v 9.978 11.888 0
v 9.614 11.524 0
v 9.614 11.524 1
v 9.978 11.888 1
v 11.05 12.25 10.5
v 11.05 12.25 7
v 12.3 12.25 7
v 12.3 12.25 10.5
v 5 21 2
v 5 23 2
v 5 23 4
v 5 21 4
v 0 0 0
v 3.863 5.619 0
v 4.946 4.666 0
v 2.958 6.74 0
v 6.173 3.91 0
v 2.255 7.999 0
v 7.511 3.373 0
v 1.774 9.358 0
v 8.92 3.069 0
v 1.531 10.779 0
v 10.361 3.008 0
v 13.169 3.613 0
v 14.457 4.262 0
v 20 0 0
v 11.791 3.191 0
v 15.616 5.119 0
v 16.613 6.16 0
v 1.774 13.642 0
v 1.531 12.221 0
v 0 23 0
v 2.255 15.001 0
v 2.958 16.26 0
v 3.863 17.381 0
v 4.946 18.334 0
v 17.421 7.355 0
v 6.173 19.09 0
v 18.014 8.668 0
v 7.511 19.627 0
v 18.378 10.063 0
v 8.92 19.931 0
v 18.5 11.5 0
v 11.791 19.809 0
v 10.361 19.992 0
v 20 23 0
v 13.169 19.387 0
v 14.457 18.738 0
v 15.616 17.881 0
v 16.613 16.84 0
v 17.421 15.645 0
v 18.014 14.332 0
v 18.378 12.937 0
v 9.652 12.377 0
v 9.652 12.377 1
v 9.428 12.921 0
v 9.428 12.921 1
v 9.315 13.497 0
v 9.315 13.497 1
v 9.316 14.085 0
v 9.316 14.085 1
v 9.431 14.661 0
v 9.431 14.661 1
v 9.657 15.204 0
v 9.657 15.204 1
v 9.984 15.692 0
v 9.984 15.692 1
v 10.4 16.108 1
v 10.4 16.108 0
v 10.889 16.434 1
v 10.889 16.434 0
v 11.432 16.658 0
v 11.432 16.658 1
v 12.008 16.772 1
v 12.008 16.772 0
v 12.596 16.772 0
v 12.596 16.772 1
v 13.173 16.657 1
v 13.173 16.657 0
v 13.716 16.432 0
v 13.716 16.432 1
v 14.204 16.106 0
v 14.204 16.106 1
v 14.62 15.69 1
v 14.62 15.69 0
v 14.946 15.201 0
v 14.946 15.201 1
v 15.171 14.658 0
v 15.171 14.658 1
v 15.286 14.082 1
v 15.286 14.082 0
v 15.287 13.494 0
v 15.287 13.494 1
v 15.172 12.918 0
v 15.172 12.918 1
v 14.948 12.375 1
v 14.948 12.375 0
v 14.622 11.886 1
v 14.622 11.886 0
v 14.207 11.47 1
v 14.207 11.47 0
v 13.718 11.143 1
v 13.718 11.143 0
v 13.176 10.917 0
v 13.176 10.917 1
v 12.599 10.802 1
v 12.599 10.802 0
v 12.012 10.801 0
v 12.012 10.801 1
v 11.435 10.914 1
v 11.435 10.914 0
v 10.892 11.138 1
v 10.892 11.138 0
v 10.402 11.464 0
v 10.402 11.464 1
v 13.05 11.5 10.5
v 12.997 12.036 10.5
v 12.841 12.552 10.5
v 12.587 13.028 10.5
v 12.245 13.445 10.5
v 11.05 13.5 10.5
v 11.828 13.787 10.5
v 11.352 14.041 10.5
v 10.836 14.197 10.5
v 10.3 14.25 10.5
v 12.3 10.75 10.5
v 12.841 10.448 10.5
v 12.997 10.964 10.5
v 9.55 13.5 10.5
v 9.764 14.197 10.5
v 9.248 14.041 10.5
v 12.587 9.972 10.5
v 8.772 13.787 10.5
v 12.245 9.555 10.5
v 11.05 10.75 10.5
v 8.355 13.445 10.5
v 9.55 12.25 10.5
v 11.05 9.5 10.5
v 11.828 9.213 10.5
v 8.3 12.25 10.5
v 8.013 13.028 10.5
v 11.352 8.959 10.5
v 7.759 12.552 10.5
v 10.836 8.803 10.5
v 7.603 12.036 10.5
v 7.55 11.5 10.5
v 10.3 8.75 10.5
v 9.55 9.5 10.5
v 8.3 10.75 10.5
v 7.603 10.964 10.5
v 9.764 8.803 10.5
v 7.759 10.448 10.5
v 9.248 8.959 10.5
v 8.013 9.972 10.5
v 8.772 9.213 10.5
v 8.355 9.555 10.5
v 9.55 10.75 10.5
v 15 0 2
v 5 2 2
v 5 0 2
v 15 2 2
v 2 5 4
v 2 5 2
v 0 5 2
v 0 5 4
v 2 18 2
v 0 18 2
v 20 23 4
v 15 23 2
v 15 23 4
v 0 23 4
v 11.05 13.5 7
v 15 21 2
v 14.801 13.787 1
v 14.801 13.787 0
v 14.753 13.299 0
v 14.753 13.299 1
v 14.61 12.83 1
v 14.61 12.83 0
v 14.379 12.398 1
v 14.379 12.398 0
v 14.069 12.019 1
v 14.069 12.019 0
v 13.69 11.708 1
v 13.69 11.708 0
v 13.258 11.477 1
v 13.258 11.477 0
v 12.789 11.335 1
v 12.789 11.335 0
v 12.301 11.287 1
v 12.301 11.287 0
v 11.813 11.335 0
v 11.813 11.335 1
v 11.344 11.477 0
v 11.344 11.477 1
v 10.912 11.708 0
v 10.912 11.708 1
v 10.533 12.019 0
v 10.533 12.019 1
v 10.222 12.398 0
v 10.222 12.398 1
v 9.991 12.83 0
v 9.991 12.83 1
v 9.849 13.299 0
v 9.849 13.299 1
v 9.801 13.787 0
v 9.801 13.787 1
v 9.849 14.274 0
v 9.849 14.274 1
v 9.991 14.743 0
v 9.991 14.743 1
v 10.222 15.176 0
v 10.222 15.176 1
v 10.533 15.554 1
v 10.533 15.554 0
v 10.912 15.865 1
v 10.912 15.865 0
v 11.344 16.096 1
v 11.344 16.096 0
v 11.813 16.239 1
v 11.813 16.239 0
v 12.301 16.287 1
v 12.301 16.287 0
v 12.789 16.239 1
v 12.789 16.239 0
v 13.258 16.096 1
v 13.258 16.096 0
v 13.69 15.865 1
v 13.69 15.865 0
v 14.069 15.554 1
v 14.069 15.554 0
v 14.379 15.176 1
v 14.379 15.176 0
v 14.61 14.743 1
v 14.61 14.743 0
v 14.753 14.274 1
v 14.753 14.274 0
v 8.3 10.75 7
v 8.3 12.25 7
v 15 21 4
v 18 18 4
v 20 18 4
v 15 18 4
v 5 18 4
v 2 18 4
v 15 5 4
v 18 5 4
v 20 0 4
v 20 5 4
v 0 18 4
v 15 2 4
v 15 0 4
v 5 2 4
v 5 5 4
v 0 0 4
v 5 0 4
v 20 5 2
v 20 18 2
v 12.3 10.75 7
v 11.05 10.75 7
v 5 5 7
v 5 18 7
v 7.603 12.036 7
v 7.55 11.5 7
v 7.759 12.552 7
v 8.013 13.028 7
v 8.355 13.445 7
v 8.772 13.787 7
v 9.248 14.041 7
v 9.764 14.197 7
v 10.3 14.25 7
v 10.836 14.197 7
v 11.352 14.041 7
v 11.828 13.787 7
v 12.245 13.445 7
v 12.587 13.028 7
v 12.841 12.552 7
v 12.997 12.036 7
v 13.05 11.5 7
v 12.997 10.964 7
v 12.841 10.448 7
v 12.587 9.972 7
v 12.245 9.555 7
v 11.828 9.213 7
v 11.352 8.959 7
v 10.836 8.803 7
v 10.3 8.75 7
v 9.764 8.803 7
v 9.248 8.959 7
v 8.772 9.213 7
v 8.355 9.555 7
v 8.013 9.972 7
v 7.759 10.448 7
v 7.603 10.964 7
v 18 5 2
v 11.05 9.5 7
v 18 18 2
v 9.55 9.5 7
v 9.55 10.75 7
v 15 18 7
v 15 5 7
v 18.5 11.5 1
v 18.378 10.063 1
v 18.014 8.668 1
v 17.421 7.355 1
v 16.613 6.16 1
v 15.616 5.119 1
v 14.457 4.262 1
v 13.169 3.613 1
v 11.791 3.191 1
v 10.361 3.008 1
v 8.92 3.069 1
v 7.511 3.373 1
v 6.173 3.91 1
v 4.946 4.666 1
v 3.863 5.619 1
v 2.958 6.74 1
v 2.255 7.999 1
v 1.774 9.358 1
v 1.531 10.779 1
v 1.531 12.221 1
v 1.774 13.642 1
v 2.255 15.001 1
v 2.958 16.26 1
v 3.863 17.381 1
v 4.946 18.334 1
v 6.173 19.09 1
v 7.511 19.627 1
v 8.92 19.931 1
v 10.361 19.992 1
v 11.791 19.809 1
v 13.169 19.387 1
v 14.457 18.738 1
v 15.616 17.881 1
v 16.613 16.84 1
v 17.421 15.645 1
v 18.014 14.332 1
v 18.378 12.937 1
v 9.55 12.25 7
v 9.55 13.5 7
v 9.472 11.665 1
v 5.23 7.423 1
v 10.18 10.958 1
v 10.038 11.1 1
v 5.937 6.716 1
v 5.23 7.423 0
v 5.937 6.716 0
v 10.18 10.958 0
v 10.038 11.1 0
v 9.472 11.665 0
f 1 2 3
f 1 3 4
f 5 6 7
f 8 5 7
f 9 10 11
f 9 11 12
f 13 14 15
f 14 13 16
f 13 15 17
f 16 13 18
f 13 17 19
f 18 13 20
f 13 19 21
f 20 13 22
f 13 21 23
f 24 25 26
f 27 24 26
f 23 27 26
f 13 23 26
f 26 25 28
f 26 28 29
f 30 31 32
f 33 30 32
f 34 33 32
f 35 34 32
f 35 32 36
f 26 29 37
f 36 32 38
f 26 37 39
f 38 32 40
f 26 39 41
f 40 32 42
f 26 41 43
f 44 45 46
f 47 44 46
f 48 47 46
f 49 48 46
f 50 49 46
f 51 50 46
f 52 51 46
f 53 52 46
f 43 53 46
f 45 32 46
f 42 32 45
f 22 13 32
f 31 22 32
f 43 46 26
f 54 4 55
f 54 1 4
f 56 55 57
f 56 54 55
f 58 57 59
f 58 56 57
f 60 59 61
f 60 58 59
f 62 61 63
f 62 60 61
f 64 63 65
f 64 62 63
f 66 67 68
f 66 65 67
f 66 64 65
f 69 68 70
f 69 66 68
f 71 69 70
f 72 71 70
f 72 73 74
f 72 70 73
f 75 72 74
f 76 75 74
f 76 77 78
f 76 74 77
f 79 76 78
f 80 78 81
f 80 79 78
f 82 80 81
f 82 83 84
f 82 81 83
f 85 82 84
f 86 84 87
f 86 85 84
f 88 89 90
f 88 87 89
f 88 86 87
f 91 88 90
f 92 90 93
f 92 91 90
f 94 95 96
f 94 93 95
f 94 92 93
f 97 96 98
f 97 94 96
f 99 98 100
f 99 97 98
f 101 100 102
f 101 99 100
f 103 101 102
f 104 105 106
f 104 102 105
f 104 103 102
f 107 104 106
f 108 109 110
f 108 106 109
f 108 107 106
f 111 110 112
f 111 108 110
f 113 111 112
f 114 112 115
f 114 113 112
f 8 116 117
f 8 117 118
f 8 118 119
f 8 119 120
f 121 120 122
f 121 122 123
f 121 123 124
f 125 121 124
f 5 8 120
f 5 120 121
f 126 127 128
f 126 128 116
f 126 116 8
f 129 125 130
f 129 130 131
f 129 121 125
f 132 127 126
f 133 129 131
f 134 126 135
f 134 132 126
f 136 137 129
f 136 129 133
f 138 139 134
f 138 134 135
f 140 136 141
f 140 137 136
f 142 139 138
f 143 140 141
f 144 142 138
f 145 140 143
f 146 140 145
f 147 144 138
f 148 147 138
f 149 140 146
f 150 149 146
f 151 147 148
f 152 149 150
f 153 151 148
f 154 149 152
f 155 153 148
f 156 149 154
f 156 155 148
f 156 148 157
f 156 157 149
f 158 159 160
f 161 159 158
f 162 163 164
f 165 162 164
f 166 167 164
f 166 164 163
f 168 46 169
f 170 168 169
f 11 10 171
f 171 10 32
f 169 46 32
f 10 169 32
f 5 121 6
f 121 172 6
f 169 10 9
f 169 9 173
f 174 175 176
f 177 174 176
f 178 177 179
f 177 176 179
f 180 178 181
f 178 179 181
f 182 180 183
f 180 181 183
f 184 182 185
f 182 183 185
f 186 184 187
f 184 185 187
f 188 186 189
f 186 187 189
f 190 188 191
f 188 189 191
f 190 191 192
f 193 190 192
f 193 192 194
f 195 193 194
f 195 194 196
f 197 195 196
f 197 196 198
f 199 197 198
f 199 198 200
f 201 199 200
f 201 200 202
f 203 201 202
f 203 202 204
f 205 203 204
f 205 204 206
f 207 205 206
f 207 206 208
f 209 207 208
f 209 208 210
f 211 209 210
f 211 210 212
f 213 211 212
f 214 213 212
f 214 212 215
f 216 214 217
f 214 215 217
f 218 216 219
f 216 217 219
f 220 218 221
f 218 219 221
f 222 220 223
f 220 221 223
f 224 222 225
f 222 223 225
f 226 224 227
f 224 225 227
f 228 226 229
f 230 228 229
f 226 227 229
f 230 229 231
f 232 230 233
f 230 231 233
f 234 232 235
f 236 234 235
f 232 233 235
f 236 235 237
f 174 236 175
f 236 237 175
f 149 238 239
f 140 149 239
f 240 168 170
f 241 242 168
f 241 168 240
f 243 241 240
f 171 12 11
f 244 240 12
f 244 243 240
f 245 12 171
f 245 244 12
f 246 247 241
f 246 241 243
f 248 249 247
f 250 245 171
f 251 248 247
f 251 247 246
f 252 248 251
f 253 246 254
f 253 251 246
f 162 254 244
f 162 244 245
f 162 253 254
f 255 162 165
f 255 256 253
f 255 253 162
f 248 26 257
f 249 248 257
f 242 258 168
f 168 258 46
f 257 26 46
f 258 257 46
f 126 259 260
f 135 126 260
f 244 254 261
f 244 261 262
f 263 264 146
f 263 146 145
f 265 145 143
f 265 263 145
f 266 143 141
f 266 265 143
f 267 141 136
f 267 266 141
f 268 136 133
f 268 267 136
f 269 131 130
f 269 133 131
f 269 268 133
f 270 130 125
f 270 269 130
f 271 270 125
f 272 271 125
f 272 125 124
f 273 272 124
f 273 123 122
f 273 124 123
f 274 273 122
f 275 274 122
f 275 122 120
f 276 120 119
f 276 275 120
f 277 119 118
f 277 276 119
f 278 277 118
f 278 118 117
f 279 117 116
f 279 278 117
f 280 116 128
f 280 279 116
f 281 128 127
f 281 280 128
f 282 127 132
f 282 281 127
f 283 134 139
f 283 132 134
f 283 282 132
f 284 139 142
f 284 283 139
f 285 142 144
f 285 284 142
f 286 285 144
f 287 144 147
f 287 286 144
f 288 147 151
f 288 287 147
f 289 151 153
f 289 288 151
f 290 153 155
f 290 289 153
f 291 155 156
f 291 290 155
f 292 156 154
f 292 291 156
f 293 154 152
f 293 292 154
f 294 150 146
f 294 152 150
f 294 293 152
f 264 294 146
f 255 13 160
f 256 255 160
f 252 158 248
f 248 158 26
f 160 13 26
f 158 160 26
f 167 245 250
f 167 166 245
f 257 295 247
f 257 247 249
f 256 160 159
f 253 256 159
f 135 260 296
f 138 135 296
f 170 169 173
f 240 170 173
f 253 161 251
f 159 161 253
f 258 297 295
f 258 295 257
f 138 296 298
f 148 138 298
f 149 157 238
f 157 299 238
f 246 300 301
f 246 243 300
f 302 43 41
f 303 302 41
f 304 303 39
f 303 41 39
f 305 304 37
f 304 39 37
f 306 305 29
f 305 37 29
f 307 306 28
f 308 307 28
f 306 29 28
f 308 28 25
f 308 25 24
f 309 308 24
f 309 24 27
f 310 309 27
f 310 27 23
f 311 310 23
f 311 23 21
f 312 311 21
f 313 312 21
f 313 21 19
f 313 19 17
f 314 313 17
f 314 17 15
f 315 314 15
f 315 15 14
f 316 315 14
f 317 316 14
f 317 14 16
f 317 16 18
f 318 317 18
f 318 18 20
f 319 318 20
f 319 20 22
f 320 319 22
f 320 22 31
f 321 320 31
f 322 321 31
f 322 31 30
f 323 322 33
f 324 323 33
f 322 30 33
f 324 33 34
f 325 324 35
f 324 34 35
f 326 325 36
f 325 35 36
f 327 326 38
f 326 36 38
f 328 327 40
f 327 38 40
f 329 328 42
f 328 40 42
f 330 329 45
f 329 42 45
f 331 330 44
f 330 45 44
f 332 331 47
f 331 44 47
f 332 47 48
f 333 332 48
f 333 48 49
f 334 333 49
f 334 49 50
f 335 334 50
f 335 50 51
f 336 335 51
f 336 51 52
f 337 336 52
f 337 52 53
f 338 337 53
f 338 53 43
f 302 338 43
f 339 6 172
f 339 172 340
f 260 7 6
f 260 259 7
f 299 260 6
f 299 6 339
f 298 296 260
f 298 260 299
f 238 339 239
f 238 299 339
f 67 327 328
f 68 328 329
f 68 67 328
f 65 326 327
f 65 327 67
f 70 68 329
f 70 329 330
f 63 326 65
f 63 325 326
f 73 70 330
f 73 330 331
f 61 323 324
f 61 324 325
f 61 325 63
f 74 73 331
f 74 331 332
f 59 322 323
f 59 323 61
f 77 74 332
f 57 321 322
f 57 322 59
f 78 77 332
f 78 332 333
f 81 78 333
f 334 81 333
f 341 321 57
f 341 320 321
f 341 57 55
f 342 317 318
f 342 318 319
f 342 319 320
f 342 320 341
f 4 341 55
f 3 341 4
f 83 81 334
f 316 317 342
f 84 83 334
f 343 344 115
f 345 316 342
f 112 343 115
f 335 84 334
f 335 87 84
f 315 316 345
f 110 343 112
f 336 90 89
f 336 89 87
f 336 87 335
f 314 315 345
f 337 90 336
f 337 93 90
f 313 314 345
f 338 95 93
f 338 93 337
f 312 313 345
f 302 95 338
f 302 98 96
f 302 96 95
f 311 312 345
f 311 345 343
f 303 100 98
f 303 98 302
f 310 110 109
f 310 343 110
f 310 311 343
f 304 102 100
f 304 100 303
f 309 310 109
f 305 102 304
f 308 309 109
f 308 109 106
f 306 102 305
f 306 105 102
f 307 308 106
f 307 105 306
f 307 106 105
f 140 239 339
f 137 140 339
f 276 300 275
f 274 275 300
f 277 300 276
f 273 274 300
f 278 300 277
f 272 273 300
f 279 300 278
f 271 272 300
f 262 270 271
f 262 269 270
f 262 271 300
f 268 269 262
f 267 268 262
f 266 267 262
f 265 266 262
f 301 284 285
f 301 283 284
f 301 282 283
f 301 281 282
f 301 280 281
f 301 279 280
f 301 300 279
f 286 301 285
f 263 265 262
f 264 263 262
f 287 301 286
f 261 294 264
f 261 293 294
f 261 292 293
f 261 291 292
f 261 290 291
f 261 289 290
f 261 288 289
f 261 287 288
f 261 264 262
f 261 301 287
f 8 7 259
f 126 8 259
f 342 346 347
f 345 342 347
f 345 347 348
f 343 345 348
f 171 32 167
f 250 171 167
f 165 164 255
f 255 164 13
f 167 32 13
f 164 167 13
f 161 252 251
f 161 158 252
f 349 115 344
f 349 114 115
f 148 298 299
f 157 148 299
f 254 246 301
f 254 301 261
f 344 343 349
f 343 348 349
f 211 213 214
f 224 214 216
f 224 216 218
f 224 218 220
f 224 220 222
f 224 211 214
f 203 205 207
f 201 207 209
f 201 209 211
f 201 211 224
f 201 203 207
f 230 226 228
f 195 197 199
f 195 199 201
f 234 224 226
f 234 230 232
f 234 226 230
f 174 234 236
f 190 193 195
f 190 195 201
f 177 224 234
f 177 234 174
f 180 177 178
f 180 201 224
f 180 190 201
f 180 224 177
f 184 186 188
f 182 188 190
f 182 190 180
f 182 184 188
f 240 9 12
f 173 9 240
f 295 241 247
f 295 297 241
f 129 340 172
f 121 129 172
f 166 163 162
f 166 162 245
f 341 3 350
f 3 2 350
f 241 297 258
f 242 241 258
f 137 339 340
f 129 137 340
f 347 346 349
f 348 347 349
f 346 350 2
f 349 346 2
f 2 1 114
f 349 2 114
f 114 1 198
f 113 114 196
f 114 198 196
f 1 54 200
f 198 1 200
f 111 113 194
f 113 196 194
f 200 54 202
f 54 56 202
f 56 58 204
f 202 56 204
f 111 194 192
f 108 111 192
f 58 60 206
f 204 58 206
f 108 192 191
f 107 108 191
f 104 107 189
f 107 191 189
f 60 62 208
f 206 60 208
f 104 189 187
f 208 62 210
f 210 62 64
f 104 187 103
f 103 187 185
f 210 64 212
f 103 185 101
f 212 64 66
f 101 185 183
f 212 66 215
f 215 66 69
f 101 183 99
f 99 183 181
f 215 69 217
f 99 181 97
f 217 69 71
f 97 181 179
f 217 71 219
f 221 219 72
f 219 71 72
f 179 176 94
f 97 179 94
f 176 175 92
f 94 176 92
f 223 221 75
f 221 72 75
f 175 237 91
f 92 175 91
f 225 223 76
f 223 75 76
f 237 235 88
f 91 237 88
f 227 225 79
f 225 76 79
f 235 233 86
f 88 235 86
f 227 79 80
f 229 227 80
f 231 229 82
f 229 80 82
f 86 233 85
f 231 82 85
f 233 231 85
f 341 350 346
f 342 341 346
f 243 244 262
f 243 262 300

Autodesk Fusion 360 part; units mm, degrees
sketch "スケッチ1" plane through (0, 0, 0) normal (0, 0, 1) x (1, 0, 0)
  line L0 (0, 0) -> (20, 0)
  line L1 (20, 0) -> (20, 23)
  line L2 (20, 23) -> (0, 23)
  line L3 (0, 23) -> (0, 0)
  dimension "d1" = 20
  dimension "d2" = 23
extrude "押し出し1" add sketch "スケッチ1" along normal blind 2
sketch "スケッチ2" plane through (0, 0, 2) normal (0, 0, 1) x (-1, 0, 0)
  line L0 (0, -23) -> (0, 0)
  line L1 (0, 0) -> (-20, 0)
  line L2 (-20, 0) -> (-20, -23)
  line L3 (-20, -23) -> (0, -23)
  line L4 (0, -23) -> (-5, -23)
  line L5 (-5, -23) -> (-5, -18)
  line L6 (-5, -18) -> (0, -18)
  line L7 (0, -18) -> (0, -23)
  line L8 (-20, -23) -> (-15, -23)
  line L9 (-15, -23) -> (-15, -18)
  line L10 (-15, -18) -> (-20, -18)
  line L11 (-20, -18) -> (-20, -23)
  line L12 (0, 0) -> (-5, 0)
  line L13 (-5, 0) -> (-5, -5)
  line L14 (-5, -5) -> (0, -5)
  line L15 (0, -5) -> (0, 0)
  line L16 (-20, 0) -> (-15, 0)
  line L17 (-15, 0) -> (-15, -5)
  line L18 (-15, -5) -> (-20, -5)
  line L19 (-20, -5) -> (-20, 0)
  line L20 (-2, -21) -> (-18, -21)
  line L21 (-18, -21) -> (-18, -2)
  line L22 (-18, -2) -> (-2, -2)
  line L23 (-2, -2) -> (-2, -21)
  dimension "d5" = 5
  dimension "d6" = 5
  dimension "d7" = 5
  dimension "d8" = 5
  dimension "d9" = 5
  dimension "d10" = 5
  dimension "d11" = 5
  dimension "d12" = 5
extrude "押し出し2" add sketch "スケッチ2" along normal blind 2 contours L0 L3 L4 L5 L6 L7 L20 L23 | L0 L1 L12 L13 L14 L15 L22 L23 | L5 L6 L20 L23 | L5 L6 L9 L10 L13 L14 L17 L18 L20 L21 L22 L23 | L2 L3 L8 L9 L10 L11 L20 L21 | L13 L14 L22 L23 | L9 L10 L20 L21 | L1 L2 L16 L17 L18 L19 L21 L22 | L17 L18 L21 L22
sketch "スケッチ3" plane through (0, 0, 4) normal (0, 0, 1) x (-1, 0, 0)
  line L0 (-18, -18) -> (-20, -18)
  line L1 (-20, -18) -> (-20, -23)
  line L2 (-20, -23) -> (-15, -23)
  line L3 (-15, -23) -> (-15, -21)
  line L4 (-15, -21) -> (-5, -21)
  line L5 (-5, -21) -> (-5, -23)
  line L6 (-5, -23) -> (0, -23)
  line L7 (0, -23) -> (0, -18)
  line L8 (0, -18) -> (-2, -18)
  line L9 (-2, -18) -> (-2, -5)
  line L10 (-2, -5) -> (0, -5)
  line L11 (0, -5) -> (0, 0)
  line L12 (0, 0) -> (-5, 0)
  line L13 (-5, 0) -> (-5, -2)
  line L14 (-5, -2) -> (-15, -2)
  line L15 (-15, -2) -> (-15, 0)
  line L16 (-15, 0) -> (-20, 0)
  line L17 (-20, 0) -> (-20, -5)
  line L18 (-20, -5) -> (-18, -5)
  line L19 (-18, -5) -> (-18, -18)
  line L20 (-5, -18) -> (-15, -18)
  line L21 (-15, -18) -> (-15, -5)
  line L22 (-15, -5) -> (-5, -5)
  line L23 (-5, -5) -> (-5, -18)
extrude "押し出し3" add sketch "スケッチ3" along normal blind 3 contours L20 L21 L22 L23
sketch "スケッチ4" plane through (0, 0, 7) normal (0, 0, 1) x (-1, 0, 0)
  line L0 (-5, -5) -> (-15, -5)
  line L1 (-15, -5) -> (-15, -18)
  line L2 (-15, -18) -> (-5, -18)
  line L3 (-5, -18) -> (-5, -5)
  line L4 (-9.55, -13.5) -> (-11.05, -13.5)
  line L5 (-11.05, -13.5) -> (-11.05, -9.5)
  line L6 (-11.05, -9.5) -> (-9.55, -9.5)
  line L7 (-9.55, -9.5) -> (-9.55, -13.5)
  line L8 (-8.3, -12.25) -> (-12.3, -12.25)
  line L9 (-12.3, -12.25) -> (-12.3, -10.75)
  line L10 (-12.3, -10.75) -> (-8.3, -10.75)
  line L11 (-8.3, -10.75) -> (-8.3, -12.25)
  circle A0 centre (-10.3, -11.5) radius 2.75
  dimension "d17" = 13
  dimension "d18" = 1.5
  dimension "d19" = 4
  dimension "d20" = 4
  dimension "d21" = 1.5
  dimension "d22" = 5.5
extrude "押し出し4" add sketch "スケッチ4" along normal blind 3.5 contours A0
sketch "スケッチ5" plane through (0, 0, 0) normal (0, 0, -1) x (1, 0, 0)
  line L0 (0, 0) -> (0, -23)
  line L1 (0, -23) -> (20, -23)
  line L2 (20, -23) -> (20, 0)
  line L3 (20, 0) -> (0, 0)
  circle A0 centre (10, -11.5) radius 8.5
  circle A1 centre (12.3008, -13.7867) radius 3
  circle A2 centre (12.3008, -13.7867) radius 2.5
  line L4 (5.2298, -7.4227) -> (5.9369, -6.7156)
  line L5 (5.9369, -6.7156) -> (10.1795, -10.9583)
  line L6 (10.1795, -10.9583) -> (9.4724, -11.6654)
  line L7 (9.4724, -11.6654) -> (5.2298, -7.4227)
  line L8 (9.978, -11.8882) -> (10.4023, -11.4639)
  line L9 (9.6138, -11.524) -> (9.978, -11.8882)
  line L10 (10.4023, -11.4639) -> (10.0381, -11.0997)
  line L11 (10.0381, -11.0997) -> (9.6138, -11.524)
extrude "押し出し5" cut sketch "スケッチ5" against normal blind 1 contours A0 | A2
